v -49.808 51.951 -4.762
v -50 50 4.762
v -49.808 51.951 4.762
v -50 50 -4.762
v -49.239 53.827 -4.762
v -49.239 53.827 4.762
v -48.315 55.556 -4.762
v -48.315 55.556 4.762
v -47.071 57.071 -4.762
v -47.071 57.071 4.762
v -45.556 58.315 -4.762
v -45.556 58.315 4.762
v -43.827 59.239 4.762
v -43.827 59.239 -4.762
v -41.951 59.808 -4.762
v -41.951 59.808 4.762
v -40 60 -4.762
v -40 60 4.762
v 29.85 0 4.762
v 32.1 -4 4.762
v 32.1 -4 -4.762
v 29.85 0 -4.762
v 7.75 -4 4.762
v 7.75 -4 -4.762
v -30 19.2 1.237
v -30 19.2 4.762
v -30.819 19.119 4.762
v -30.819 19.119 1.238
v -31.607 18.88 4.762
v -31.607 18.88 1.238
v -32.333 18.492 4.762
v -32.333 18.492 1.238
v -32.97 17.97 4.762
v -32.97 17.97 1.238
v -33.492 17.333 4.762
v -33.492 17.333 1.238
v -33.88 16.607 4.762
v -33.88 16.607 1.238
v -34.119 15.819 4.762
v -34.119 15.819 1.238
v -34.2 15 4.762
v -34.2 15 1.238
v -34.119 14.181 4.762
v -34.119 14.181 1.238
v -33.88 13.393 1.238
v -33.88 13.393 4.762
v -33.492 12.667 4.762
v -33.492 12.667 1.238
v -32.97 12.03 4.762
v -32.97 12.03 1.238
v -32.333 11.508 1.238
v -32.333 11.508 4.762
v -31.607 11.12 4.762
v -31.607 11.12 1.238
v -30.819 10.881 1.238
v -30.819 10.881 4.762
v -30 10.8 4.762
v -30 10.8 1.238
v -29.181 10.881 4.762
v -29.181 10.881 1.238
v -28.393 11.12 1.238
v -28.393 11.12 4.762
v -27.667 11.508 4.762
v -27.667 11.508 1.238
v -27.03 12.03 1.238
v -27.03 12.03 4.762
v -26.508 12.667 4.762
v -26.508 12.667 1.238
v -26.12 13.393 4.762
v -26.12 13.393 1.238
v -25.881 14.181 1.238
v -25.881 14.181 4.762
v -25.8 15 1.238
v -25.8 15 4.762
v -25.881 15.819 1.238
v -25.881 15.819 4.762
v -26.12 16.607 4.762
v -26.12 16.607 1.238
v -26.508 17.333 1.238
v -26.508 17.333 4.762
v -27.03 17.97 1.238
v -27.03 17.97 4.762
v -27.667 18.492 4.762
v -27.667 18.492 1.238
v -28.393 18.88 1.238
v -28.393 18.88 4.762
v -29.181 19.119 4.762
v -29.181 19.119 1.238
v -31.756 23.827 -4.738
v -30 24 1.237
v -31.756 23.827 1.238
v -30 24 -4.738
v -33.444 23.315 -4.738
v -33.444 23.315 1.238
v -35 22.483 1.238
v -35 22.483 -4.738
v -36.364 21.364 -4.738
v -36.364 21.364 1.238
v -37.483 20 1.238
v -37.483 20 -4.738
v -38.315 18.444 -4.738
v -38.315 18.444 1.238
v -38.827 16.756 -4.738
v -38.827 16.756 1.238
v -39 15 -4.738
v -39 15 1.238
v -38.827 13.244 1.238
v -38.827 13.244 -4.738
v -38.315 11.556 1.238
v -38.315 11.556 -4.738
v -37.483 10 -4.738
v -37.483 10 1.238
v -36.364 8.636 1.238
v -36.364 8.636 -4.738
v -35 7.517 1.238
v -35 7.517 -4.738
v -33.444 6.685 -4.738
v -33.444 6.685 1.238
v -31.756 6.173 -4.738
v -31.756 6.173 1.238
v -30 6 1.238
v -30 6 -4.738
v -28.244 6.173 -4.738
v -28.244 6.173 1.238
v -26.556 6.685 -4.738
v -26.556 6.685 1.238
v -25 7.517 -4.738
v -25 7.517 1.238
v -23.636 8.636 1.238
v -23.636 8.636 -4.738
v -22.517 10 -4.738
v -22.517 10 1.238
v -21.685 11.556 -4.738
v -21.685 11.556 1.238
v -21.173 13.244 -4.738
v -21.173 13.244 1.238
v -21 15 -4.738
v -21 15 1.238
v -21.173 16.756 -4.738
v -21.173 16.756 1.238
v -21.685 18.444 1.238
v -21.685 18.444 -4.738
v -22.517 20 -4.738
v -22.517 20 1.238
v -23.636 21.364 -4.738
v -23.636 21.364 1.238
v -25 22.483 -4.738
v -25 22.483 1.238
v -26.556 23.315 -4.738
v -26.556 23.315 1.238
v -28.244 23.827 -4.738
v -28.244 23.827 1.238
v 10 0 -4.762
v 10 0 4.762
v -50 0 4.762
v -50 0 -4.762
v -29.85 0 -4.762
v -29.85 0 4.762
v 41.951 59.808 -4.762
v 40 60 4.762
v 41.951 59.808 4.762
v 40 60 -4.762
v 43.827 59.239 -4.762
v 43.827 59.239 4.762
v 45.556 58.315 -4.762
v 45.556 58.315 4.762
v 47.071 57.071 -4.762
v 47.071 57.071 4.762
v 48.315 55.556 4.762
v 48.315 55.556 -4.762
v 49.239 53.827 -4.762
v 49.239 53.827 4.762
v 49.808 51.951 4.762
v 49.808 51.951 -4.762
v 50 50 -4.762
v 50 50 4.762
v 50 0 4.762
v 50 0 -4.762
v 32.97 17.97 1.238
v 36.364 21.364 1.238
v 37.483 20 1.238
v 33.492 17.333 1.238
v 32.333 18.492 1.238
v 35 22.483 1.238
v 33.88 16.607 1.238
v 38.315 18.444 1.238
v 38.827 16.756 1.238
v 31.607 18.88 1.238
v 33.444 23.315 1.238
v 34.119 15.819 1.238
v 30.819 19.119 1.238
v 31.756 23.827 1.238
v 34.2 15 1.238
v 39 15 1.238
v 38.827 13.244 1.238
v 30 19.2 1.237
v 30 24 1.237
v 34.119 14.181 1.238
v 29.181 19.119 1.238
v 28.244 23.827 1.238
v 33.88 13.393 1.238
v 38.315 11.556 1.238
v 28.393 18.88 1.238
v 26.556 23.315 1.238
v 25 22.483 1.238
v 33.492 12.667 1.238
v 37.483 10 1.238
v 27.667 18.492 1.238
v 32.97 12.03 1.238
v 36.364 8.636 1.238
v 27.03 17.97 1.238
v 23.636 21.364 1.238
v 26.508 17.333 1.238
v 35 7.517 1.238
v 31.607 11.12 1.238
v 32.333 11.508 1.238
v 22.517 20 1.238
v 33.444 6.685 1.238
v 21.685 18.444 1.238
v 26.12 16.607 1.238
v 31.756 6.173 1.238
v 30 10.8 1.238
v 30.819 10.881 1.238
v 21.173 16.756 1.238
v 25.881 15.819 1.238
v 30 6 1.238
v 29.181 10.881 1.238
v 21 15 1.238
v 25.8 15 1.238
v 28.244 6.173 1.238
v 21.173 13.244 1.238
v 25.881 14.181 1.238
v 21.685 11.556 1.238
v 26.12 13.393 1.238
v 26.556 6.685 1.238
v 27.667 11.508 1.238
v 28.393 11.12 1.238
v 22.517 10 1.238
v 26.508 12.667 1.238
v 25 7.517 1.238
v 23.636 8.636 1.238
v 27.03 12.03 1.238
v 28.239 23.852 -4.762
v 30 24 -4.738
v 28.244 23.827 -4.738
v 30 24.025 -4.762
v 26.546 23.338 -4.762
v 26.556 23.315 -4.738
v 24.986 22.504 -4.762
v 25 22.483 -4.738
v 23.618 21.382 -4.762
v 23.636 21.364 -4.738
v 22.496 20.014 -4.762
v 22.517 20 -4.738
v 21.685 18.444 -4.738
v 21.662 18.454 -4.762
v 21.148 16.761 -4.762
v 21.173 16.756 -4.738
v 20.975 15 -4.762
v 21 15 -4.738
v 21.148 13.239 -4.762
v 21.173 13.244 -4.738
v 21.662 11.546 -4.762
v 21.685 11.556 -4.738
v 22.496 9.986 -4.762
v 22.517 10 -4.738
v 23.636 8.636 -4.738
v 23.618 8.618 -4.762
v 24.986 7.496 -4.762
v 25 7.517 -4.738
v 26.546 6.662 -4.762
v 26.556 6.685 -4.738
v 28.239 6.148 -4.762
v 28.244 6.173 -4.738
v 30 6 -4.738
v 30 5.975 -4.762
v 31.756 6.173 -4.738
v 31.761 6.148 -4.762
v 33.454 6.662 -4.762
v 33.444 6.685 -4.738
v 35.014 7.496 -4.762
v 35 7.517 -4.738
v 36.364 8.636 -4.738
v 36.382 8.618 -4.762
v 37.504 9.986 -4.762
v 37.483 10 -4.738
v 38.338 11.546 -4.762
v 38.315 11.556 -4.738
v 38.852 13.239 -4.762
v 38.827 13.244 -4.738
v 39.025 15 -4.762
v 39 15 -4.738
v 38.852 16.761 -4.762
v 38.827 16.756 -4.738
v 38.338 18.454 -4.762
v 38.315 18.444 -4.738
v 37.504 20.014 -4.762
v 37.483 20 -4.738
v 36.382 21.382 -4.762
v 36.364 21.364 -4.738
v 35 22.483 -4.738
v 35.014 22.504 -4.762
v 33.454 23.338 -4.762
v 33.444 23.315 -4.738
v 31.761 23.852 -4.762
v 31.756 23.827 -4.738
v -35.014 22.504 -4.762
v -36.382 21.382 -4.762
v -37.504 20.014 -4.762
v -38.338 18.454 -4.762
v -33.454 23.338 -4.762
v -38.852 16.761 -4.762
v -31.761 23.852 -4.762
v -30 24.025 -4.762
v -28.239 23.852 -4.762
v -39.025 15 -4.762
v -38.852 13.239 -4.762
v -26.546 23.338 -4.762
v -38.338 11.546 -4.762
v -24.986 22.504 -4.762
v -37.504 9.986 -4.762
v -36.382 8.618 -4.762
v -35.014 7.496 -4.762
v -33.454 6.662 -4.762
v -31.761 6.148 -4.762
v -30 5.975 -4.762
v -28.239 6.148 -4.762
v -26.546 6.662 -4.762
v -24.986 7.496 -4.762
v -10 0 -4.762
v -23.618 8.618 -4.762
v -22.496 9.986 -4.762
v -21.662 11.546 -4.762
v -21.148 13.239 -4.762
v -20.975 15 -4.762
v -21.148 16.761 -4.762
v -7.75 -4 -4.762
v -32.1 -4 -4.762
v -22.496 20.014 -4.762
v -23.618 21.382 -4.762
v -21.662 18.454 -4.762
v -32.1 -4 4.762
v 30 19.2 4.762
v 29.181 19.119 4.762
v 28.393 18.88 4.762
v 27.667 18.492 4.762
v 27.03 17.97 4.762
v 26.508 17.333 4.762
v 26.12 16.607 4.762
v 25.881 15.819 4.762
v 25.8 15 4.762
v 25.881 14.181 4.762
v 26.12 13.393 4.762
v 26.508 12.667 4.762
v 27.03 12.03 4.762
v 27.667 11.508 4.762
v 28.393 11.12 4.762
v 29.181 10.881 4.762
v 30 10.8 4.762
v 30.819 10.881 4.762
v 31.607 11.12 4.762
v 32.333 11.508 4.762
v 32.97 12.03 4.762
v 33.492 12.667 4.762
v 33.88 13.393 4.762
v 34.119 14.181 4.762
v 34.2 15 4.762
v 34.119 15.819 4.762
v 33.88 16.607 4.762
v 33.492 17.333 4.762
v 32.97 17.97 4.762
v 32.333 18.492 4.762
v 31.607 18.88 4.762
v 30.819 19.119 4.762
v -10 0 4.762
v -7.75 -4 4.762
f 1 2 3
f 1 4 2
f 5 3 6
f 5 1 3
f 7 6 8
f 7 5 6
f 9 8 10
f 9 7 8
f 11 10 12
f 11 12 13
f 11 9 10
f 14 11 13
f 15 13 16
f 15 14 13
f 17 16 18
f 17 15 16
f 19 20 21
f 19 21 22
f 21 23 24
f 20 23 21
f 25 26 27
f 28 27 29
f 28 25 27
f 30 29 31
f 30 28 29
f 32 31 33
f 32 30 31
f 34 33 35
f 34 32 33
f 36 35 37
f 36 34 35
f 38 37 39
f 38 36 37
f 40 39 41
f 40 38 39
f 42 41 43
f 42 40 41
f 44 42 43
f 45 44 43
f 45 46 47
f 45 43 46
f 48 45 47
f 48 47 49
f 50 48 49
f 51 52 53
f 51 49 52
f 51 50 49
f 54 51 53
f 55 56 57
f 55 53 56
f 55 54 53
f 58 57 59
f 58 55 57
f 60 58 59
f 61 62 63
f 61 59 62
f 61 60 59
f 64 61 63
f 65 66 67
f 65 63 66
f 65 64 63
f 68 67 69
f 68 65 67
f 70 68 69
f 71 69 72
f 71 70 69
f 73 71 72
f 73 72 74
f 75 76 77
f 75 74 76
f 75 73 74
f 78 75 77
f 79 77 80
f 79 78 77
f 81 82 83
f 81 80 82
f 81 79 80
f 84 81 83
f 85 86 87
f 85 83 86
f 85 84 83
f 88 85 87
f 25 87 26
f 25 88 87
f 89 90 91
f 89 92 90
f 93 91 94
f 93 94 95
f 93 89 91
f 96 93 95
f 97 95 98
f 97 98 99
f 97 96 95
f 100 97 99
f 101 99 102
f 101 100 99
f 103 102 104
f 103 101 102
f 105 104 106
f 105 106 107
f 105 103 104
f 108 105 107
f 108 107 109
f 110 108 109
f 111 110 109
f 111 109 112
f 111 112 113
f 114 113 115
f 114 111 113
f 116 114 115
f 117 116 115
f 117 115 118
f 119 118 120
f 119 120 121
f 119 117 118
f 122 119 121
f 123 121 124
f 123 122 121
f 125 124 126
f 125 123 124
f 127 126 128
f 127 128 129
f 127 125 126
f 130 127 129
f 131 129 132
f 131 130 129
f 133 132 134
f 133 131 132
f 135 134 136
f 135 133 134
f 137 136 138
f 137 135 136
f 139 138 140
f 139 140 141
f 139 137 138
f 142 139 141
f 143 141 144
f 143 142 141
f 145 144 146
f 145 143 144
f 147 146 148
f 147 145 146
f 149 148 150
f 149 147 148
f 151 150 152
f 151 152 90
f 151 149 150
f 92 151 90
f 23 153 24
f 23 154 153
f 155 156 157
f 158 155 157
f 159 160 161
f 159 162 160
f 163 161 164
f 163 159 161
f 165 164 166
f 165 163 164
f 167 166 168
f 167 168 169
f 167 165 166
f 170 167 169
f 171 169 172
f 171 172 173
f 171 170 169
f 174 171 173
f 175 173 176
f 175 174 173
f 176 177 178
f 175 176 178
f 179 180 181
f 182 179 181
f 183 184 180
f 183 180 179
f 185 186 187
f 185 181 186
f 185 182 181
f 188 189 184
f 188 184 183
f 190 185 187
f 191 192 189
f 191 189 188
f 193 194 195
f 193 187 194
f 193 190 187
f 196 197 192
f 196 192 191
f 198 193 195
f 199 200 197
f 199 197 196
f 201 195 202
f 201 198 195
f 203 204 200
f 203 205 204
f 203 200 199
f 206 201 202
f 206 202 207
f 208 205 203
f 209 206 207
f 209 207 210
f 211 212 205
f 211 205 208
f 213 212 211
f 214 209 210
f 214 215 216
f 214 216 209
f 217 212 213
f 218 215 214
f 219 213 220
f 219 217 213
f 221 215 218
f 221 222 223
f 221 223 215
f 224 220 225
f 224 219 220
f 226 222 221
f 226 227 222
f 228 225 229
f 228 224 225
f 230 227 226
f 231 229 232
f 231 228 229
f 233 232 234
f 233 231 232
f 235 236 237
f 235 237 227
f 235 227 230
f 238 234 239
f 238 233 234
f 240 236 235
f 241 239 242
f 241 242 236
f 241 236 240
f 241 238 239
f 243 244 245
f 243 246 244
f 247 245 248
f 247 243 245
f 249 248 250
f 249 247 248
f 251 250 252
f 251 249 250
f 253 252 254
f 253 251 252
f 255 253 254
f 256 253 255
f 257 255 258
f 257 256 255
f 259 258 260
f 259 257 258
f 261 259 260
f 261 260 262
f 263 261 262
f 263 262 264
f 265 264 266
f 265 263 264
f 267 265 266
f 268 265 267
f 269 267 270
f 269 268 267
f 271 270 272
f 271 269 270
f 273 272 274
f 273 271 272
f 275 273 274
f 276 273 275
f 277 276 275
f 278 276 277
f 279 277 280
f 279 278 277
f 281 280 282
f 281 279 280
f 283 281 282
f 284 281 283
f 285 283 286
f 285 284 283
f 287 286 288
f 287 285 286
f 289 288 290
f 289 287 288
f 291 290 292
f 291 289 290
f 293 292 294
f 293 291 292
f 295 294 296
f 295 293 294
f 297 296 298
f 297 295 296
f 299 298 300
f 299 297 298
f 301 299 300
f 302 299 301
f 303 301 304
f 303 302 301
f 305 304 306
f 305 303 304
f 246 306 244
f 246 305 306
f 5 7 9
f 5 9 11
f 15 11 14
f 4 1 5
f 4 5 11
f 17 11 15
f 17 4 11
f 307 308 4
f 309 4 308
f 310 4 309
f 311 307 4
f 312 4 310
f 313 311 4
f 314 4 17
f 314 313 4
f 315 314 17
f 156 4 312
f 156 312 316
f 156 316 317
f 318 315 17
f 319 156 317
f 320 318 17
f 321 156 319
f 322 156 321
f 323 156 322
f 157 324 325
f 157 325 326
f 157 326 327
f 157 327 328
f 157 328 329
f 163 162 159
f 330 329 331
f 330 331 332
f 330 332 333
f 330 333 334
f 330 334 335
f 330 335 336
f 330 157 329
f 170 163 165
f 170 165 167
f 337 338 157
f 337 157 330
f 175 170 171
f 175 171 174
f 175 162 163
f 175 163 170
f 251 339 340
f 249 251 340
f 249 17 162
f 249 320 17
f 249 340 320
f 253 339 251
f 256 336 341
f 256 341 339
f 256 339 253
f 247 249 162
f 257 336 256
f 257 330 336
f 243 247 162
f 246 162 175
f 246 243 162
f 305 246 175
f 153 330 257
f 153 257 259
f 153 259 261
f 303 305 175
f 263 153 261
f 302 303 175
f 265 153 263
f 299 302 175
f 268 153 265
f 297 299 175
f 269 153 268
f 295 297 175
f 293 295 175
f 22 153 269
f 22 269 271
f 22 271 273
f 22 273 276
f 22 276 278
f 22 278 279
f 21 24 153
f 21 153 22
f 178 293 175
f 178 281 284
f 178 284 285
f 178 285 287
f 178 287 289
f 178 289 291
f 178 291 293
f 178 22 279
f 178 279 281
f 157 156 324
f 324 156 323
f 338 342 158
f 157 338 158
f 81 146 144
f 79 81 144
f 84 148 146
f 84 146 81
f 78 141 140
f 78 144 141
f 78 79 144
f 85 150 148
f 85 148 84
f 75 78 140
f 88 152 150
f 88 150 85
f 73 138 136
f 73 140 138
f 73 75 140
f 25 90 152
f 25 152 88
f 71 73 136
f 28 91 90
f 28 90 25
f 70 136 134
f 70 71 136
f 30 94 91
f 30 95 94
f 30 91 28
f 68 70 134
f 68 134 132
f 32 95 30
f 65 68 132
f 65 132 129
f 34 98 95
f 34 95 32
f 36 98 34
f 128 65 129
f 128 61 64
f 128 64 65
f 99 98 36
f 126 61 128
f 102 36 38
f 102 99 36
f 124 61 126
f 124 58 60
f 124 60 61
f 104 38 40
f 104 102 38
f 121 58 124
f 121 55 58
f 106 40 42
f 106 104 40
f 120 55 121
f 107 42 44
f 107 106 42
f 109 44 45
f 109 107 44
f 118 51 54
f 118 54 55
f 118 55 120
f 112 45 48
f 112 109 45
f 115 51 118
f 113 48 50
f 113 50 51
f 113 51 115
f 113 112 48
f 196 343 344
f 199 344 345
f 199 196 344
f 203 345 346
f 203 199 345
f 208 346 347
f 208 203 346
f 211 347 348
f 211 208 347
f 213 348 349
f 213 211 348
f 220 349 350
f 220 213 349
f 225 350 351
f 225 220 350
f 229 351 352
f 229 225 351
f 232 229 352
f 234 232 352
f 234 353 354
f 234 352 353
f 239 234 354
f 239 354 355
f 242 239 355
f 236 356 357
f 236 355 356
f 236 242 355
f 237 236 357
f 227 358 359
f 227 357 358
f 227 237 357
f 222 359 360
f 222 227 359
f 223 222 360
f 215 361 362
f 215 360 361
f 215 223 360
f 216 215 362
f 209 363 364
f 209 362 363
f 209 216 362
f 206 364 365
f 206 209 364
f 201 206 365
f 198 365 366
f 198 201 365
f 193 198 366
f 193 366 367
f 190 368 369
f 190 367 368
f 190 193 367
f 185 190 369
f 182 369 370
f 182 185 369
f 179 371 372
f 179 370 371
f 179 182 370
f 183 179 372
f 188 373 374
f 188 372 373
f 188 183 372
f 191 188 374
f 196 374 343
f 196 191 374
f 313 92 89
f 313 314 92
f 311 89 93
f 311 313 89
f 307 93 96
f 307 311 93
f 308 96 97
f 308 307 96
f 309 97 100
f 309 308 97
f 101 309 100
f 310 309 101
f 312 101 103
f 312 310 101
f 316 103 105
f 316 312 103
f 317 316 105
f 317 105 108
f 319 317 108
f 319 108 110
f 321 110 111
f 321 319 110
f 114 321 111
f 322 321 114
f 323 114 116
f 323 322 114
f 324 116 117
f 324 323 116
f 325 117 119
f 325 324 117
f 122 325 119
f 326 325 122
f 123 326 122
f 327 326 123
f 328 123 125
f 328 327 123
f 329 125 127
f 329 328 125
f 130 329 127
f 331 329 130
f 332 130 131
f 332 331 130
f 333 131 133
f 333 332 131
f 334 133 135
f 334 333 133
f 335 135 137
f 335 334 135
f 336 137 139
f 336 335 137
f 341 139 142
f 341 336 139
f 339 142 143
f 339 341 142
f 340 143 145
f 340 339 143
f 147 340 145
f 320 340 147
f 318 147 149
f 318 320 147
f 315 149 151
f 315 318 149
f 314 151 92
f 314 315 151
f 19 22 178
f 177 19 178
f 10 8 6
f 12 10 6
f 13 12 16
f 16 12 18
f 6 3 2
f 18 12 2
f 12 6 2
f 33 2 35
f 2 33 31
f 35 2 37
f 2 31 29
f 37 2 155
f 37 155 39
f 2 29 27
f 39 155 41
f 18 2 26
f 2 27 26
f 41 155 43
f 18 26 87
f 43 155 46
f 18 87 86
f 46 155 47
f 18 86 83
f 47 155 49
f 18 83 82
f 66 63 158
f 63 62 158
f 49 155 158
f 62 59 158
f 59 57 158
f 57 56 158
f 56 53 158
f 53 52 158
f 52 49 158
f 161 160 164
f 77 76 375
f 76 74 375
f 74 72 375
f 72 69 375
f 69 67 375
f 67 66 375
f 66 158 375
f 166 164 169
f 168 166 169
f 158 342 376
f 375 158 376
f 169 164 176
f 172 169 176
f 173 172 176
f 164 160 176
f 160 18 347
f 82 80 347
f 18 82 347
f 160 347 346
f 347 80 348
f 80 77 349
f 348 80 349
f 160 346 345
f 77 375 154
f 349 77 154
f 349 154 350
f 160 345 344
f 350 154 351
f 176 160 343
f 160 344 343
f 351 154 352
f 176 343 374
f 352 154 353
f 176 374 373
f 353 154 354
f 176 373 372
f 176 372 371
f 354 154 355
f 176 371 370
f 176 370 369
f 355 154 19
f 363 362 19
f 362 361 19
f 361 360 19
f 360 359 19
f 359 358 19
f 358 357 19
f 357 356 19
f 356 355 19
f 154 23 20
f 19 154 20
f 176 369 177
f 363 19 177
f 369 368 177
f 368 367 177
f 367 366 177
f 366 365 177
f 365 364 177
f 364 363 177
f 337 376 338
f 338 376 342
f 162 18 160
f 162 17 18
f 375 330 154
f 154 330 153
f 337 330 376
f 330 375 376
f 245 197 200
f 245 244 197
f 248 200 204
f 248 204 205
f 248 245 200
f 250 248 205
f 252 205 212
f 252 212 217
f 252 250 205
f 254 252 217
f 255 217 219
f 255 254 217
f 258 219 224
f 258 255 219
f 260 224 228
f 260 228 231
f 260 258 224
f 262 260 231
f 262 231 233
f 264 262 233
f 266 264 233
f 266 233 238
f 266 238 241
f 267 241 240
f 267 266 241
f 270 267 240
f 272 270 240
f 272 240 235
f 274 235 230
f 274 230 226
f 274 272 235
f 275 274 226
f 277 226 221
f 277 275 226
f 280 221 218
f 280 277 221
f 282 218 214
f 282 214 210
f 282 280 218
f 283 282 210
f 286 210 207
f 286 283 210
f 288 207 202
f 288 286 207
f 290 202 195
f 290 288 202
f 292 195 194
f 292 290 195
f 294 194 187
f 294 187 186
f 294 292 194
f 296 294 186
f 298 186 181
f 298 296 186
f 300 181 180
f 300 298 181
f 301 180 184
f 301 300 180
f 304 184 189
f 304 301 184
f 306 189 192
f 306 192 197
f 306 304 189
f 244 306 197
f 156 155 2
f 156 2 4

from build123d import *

# Parameters (mm, degrees)
ESBO_O1_W                                    = 100
ESBO_O1_H                                    = 9.525
RESSALTO_EXTRUS_O1_DEPTH                     = 60
RESSALTO_EXTRUS_O2_DEPTH                     = 4.7625
FILETE1_R                                    = 10
ESBO_O3_R                                    = 4
CORTE_EXTRUS_O1_DEPTH                        = 79.68116436
REBAIXO_PARA_PARAFUSO_COM_CABE_A_PAN_2_COUNT = 2
REBAIXO_PARA_PARAFUSO_COM_CABE_A_PAN_2_PITCH = 60


with BuildPart() as part:
    # Esboço1 → Ressalto-extrusão1 (new body)
    with BuildSketch(Plane(origin=(0, 0, 0), x_dir=(1, 0, 0), z_dir=(0, 1, 0))):
        Rectangle(ESBO_O1_W, ESBO_O1_H)
    extrude(amount=RESSALTO_EXTRUS_O1_DEPTH)

    # Esboço2 → Ressalto-extrusão2 (add, symmetric)
    with BuildSketch(Plane.XY):
        Polygon((-29.85, 0), (-10, 0), (-7.75, -4), (-32.1, -4), align=None)
    ressalto_extrus_o2 = extrude(amount=RESSALTO_EXTRUS_O2_DEPTH, both=True)

    # Espelhar1: Ressalto-extrusão2 across plane
    add(ressalto_extrus_o2.mirror(Plane(origin=(0, 0, 0), x_dir=(0, 0, 1), z_dir=(1, 0, 0))))

    # Filete1
    filete1_edges = [part.edges().sort_by_distance(p)[0] for p in [
        (50, 60, 0),
        (-50, 60, 0),
    ]]
    fillet(filete1_edges, radius=FILETE1_R)

    # Esboço3 → Corte-extrusão1 (cut, through all)
    with BuildSketch(Plane.XY.offset(4.7625)):
        with Locations((-30, 15)):
            Circle(ESBO_O3_R)
        with Locations((30, 15)):
            Circle(ESBO_O3_R)
    extrude(amount=-CORTE_EXTRUS_O1_DEPTH, mode=Mode.SUBTRACT)

    # Esboço9 → Rebaixo para parafuso com cabeça panela de M82 (revolve, cut)
    with BuildSketch(Plane(origin=(30, 15, -4.7625), x_dir=(0, 1, 0), z_dir=(1, 0, 0))):
        Polygon((0, 0), (0, 22.5736146), (4.2, 20.05), (4.2, 6), (9, 6), (9, 0.025), (9.025, 0), align=None)
    rebaixo_para_parafuso_com_cabe_a_panela = revolve(axis=Axis((30, 15, -11.1125), (0, 0, 1)), mode=Mode.SUBTRACT)

    # Rebaixo para parafuso com cabe_a pan 2: Rebaixo para parafuso com cabeça panela de M82 ×2
    with Locations(*[(-i * REBAIXO_PARA_PARAFUSO_COM_CABE_A_PAN_2_PITCH, 0, 0) for i in range(1, REBAIXO_PARA_PARAFUSO_COM_CABE_A_PAN_2_COUNT)]):
        add(rebaixo_para_parafuso_com_cabe_a_panela, mode=Mode.SUBTRACT)


solid = part.part
